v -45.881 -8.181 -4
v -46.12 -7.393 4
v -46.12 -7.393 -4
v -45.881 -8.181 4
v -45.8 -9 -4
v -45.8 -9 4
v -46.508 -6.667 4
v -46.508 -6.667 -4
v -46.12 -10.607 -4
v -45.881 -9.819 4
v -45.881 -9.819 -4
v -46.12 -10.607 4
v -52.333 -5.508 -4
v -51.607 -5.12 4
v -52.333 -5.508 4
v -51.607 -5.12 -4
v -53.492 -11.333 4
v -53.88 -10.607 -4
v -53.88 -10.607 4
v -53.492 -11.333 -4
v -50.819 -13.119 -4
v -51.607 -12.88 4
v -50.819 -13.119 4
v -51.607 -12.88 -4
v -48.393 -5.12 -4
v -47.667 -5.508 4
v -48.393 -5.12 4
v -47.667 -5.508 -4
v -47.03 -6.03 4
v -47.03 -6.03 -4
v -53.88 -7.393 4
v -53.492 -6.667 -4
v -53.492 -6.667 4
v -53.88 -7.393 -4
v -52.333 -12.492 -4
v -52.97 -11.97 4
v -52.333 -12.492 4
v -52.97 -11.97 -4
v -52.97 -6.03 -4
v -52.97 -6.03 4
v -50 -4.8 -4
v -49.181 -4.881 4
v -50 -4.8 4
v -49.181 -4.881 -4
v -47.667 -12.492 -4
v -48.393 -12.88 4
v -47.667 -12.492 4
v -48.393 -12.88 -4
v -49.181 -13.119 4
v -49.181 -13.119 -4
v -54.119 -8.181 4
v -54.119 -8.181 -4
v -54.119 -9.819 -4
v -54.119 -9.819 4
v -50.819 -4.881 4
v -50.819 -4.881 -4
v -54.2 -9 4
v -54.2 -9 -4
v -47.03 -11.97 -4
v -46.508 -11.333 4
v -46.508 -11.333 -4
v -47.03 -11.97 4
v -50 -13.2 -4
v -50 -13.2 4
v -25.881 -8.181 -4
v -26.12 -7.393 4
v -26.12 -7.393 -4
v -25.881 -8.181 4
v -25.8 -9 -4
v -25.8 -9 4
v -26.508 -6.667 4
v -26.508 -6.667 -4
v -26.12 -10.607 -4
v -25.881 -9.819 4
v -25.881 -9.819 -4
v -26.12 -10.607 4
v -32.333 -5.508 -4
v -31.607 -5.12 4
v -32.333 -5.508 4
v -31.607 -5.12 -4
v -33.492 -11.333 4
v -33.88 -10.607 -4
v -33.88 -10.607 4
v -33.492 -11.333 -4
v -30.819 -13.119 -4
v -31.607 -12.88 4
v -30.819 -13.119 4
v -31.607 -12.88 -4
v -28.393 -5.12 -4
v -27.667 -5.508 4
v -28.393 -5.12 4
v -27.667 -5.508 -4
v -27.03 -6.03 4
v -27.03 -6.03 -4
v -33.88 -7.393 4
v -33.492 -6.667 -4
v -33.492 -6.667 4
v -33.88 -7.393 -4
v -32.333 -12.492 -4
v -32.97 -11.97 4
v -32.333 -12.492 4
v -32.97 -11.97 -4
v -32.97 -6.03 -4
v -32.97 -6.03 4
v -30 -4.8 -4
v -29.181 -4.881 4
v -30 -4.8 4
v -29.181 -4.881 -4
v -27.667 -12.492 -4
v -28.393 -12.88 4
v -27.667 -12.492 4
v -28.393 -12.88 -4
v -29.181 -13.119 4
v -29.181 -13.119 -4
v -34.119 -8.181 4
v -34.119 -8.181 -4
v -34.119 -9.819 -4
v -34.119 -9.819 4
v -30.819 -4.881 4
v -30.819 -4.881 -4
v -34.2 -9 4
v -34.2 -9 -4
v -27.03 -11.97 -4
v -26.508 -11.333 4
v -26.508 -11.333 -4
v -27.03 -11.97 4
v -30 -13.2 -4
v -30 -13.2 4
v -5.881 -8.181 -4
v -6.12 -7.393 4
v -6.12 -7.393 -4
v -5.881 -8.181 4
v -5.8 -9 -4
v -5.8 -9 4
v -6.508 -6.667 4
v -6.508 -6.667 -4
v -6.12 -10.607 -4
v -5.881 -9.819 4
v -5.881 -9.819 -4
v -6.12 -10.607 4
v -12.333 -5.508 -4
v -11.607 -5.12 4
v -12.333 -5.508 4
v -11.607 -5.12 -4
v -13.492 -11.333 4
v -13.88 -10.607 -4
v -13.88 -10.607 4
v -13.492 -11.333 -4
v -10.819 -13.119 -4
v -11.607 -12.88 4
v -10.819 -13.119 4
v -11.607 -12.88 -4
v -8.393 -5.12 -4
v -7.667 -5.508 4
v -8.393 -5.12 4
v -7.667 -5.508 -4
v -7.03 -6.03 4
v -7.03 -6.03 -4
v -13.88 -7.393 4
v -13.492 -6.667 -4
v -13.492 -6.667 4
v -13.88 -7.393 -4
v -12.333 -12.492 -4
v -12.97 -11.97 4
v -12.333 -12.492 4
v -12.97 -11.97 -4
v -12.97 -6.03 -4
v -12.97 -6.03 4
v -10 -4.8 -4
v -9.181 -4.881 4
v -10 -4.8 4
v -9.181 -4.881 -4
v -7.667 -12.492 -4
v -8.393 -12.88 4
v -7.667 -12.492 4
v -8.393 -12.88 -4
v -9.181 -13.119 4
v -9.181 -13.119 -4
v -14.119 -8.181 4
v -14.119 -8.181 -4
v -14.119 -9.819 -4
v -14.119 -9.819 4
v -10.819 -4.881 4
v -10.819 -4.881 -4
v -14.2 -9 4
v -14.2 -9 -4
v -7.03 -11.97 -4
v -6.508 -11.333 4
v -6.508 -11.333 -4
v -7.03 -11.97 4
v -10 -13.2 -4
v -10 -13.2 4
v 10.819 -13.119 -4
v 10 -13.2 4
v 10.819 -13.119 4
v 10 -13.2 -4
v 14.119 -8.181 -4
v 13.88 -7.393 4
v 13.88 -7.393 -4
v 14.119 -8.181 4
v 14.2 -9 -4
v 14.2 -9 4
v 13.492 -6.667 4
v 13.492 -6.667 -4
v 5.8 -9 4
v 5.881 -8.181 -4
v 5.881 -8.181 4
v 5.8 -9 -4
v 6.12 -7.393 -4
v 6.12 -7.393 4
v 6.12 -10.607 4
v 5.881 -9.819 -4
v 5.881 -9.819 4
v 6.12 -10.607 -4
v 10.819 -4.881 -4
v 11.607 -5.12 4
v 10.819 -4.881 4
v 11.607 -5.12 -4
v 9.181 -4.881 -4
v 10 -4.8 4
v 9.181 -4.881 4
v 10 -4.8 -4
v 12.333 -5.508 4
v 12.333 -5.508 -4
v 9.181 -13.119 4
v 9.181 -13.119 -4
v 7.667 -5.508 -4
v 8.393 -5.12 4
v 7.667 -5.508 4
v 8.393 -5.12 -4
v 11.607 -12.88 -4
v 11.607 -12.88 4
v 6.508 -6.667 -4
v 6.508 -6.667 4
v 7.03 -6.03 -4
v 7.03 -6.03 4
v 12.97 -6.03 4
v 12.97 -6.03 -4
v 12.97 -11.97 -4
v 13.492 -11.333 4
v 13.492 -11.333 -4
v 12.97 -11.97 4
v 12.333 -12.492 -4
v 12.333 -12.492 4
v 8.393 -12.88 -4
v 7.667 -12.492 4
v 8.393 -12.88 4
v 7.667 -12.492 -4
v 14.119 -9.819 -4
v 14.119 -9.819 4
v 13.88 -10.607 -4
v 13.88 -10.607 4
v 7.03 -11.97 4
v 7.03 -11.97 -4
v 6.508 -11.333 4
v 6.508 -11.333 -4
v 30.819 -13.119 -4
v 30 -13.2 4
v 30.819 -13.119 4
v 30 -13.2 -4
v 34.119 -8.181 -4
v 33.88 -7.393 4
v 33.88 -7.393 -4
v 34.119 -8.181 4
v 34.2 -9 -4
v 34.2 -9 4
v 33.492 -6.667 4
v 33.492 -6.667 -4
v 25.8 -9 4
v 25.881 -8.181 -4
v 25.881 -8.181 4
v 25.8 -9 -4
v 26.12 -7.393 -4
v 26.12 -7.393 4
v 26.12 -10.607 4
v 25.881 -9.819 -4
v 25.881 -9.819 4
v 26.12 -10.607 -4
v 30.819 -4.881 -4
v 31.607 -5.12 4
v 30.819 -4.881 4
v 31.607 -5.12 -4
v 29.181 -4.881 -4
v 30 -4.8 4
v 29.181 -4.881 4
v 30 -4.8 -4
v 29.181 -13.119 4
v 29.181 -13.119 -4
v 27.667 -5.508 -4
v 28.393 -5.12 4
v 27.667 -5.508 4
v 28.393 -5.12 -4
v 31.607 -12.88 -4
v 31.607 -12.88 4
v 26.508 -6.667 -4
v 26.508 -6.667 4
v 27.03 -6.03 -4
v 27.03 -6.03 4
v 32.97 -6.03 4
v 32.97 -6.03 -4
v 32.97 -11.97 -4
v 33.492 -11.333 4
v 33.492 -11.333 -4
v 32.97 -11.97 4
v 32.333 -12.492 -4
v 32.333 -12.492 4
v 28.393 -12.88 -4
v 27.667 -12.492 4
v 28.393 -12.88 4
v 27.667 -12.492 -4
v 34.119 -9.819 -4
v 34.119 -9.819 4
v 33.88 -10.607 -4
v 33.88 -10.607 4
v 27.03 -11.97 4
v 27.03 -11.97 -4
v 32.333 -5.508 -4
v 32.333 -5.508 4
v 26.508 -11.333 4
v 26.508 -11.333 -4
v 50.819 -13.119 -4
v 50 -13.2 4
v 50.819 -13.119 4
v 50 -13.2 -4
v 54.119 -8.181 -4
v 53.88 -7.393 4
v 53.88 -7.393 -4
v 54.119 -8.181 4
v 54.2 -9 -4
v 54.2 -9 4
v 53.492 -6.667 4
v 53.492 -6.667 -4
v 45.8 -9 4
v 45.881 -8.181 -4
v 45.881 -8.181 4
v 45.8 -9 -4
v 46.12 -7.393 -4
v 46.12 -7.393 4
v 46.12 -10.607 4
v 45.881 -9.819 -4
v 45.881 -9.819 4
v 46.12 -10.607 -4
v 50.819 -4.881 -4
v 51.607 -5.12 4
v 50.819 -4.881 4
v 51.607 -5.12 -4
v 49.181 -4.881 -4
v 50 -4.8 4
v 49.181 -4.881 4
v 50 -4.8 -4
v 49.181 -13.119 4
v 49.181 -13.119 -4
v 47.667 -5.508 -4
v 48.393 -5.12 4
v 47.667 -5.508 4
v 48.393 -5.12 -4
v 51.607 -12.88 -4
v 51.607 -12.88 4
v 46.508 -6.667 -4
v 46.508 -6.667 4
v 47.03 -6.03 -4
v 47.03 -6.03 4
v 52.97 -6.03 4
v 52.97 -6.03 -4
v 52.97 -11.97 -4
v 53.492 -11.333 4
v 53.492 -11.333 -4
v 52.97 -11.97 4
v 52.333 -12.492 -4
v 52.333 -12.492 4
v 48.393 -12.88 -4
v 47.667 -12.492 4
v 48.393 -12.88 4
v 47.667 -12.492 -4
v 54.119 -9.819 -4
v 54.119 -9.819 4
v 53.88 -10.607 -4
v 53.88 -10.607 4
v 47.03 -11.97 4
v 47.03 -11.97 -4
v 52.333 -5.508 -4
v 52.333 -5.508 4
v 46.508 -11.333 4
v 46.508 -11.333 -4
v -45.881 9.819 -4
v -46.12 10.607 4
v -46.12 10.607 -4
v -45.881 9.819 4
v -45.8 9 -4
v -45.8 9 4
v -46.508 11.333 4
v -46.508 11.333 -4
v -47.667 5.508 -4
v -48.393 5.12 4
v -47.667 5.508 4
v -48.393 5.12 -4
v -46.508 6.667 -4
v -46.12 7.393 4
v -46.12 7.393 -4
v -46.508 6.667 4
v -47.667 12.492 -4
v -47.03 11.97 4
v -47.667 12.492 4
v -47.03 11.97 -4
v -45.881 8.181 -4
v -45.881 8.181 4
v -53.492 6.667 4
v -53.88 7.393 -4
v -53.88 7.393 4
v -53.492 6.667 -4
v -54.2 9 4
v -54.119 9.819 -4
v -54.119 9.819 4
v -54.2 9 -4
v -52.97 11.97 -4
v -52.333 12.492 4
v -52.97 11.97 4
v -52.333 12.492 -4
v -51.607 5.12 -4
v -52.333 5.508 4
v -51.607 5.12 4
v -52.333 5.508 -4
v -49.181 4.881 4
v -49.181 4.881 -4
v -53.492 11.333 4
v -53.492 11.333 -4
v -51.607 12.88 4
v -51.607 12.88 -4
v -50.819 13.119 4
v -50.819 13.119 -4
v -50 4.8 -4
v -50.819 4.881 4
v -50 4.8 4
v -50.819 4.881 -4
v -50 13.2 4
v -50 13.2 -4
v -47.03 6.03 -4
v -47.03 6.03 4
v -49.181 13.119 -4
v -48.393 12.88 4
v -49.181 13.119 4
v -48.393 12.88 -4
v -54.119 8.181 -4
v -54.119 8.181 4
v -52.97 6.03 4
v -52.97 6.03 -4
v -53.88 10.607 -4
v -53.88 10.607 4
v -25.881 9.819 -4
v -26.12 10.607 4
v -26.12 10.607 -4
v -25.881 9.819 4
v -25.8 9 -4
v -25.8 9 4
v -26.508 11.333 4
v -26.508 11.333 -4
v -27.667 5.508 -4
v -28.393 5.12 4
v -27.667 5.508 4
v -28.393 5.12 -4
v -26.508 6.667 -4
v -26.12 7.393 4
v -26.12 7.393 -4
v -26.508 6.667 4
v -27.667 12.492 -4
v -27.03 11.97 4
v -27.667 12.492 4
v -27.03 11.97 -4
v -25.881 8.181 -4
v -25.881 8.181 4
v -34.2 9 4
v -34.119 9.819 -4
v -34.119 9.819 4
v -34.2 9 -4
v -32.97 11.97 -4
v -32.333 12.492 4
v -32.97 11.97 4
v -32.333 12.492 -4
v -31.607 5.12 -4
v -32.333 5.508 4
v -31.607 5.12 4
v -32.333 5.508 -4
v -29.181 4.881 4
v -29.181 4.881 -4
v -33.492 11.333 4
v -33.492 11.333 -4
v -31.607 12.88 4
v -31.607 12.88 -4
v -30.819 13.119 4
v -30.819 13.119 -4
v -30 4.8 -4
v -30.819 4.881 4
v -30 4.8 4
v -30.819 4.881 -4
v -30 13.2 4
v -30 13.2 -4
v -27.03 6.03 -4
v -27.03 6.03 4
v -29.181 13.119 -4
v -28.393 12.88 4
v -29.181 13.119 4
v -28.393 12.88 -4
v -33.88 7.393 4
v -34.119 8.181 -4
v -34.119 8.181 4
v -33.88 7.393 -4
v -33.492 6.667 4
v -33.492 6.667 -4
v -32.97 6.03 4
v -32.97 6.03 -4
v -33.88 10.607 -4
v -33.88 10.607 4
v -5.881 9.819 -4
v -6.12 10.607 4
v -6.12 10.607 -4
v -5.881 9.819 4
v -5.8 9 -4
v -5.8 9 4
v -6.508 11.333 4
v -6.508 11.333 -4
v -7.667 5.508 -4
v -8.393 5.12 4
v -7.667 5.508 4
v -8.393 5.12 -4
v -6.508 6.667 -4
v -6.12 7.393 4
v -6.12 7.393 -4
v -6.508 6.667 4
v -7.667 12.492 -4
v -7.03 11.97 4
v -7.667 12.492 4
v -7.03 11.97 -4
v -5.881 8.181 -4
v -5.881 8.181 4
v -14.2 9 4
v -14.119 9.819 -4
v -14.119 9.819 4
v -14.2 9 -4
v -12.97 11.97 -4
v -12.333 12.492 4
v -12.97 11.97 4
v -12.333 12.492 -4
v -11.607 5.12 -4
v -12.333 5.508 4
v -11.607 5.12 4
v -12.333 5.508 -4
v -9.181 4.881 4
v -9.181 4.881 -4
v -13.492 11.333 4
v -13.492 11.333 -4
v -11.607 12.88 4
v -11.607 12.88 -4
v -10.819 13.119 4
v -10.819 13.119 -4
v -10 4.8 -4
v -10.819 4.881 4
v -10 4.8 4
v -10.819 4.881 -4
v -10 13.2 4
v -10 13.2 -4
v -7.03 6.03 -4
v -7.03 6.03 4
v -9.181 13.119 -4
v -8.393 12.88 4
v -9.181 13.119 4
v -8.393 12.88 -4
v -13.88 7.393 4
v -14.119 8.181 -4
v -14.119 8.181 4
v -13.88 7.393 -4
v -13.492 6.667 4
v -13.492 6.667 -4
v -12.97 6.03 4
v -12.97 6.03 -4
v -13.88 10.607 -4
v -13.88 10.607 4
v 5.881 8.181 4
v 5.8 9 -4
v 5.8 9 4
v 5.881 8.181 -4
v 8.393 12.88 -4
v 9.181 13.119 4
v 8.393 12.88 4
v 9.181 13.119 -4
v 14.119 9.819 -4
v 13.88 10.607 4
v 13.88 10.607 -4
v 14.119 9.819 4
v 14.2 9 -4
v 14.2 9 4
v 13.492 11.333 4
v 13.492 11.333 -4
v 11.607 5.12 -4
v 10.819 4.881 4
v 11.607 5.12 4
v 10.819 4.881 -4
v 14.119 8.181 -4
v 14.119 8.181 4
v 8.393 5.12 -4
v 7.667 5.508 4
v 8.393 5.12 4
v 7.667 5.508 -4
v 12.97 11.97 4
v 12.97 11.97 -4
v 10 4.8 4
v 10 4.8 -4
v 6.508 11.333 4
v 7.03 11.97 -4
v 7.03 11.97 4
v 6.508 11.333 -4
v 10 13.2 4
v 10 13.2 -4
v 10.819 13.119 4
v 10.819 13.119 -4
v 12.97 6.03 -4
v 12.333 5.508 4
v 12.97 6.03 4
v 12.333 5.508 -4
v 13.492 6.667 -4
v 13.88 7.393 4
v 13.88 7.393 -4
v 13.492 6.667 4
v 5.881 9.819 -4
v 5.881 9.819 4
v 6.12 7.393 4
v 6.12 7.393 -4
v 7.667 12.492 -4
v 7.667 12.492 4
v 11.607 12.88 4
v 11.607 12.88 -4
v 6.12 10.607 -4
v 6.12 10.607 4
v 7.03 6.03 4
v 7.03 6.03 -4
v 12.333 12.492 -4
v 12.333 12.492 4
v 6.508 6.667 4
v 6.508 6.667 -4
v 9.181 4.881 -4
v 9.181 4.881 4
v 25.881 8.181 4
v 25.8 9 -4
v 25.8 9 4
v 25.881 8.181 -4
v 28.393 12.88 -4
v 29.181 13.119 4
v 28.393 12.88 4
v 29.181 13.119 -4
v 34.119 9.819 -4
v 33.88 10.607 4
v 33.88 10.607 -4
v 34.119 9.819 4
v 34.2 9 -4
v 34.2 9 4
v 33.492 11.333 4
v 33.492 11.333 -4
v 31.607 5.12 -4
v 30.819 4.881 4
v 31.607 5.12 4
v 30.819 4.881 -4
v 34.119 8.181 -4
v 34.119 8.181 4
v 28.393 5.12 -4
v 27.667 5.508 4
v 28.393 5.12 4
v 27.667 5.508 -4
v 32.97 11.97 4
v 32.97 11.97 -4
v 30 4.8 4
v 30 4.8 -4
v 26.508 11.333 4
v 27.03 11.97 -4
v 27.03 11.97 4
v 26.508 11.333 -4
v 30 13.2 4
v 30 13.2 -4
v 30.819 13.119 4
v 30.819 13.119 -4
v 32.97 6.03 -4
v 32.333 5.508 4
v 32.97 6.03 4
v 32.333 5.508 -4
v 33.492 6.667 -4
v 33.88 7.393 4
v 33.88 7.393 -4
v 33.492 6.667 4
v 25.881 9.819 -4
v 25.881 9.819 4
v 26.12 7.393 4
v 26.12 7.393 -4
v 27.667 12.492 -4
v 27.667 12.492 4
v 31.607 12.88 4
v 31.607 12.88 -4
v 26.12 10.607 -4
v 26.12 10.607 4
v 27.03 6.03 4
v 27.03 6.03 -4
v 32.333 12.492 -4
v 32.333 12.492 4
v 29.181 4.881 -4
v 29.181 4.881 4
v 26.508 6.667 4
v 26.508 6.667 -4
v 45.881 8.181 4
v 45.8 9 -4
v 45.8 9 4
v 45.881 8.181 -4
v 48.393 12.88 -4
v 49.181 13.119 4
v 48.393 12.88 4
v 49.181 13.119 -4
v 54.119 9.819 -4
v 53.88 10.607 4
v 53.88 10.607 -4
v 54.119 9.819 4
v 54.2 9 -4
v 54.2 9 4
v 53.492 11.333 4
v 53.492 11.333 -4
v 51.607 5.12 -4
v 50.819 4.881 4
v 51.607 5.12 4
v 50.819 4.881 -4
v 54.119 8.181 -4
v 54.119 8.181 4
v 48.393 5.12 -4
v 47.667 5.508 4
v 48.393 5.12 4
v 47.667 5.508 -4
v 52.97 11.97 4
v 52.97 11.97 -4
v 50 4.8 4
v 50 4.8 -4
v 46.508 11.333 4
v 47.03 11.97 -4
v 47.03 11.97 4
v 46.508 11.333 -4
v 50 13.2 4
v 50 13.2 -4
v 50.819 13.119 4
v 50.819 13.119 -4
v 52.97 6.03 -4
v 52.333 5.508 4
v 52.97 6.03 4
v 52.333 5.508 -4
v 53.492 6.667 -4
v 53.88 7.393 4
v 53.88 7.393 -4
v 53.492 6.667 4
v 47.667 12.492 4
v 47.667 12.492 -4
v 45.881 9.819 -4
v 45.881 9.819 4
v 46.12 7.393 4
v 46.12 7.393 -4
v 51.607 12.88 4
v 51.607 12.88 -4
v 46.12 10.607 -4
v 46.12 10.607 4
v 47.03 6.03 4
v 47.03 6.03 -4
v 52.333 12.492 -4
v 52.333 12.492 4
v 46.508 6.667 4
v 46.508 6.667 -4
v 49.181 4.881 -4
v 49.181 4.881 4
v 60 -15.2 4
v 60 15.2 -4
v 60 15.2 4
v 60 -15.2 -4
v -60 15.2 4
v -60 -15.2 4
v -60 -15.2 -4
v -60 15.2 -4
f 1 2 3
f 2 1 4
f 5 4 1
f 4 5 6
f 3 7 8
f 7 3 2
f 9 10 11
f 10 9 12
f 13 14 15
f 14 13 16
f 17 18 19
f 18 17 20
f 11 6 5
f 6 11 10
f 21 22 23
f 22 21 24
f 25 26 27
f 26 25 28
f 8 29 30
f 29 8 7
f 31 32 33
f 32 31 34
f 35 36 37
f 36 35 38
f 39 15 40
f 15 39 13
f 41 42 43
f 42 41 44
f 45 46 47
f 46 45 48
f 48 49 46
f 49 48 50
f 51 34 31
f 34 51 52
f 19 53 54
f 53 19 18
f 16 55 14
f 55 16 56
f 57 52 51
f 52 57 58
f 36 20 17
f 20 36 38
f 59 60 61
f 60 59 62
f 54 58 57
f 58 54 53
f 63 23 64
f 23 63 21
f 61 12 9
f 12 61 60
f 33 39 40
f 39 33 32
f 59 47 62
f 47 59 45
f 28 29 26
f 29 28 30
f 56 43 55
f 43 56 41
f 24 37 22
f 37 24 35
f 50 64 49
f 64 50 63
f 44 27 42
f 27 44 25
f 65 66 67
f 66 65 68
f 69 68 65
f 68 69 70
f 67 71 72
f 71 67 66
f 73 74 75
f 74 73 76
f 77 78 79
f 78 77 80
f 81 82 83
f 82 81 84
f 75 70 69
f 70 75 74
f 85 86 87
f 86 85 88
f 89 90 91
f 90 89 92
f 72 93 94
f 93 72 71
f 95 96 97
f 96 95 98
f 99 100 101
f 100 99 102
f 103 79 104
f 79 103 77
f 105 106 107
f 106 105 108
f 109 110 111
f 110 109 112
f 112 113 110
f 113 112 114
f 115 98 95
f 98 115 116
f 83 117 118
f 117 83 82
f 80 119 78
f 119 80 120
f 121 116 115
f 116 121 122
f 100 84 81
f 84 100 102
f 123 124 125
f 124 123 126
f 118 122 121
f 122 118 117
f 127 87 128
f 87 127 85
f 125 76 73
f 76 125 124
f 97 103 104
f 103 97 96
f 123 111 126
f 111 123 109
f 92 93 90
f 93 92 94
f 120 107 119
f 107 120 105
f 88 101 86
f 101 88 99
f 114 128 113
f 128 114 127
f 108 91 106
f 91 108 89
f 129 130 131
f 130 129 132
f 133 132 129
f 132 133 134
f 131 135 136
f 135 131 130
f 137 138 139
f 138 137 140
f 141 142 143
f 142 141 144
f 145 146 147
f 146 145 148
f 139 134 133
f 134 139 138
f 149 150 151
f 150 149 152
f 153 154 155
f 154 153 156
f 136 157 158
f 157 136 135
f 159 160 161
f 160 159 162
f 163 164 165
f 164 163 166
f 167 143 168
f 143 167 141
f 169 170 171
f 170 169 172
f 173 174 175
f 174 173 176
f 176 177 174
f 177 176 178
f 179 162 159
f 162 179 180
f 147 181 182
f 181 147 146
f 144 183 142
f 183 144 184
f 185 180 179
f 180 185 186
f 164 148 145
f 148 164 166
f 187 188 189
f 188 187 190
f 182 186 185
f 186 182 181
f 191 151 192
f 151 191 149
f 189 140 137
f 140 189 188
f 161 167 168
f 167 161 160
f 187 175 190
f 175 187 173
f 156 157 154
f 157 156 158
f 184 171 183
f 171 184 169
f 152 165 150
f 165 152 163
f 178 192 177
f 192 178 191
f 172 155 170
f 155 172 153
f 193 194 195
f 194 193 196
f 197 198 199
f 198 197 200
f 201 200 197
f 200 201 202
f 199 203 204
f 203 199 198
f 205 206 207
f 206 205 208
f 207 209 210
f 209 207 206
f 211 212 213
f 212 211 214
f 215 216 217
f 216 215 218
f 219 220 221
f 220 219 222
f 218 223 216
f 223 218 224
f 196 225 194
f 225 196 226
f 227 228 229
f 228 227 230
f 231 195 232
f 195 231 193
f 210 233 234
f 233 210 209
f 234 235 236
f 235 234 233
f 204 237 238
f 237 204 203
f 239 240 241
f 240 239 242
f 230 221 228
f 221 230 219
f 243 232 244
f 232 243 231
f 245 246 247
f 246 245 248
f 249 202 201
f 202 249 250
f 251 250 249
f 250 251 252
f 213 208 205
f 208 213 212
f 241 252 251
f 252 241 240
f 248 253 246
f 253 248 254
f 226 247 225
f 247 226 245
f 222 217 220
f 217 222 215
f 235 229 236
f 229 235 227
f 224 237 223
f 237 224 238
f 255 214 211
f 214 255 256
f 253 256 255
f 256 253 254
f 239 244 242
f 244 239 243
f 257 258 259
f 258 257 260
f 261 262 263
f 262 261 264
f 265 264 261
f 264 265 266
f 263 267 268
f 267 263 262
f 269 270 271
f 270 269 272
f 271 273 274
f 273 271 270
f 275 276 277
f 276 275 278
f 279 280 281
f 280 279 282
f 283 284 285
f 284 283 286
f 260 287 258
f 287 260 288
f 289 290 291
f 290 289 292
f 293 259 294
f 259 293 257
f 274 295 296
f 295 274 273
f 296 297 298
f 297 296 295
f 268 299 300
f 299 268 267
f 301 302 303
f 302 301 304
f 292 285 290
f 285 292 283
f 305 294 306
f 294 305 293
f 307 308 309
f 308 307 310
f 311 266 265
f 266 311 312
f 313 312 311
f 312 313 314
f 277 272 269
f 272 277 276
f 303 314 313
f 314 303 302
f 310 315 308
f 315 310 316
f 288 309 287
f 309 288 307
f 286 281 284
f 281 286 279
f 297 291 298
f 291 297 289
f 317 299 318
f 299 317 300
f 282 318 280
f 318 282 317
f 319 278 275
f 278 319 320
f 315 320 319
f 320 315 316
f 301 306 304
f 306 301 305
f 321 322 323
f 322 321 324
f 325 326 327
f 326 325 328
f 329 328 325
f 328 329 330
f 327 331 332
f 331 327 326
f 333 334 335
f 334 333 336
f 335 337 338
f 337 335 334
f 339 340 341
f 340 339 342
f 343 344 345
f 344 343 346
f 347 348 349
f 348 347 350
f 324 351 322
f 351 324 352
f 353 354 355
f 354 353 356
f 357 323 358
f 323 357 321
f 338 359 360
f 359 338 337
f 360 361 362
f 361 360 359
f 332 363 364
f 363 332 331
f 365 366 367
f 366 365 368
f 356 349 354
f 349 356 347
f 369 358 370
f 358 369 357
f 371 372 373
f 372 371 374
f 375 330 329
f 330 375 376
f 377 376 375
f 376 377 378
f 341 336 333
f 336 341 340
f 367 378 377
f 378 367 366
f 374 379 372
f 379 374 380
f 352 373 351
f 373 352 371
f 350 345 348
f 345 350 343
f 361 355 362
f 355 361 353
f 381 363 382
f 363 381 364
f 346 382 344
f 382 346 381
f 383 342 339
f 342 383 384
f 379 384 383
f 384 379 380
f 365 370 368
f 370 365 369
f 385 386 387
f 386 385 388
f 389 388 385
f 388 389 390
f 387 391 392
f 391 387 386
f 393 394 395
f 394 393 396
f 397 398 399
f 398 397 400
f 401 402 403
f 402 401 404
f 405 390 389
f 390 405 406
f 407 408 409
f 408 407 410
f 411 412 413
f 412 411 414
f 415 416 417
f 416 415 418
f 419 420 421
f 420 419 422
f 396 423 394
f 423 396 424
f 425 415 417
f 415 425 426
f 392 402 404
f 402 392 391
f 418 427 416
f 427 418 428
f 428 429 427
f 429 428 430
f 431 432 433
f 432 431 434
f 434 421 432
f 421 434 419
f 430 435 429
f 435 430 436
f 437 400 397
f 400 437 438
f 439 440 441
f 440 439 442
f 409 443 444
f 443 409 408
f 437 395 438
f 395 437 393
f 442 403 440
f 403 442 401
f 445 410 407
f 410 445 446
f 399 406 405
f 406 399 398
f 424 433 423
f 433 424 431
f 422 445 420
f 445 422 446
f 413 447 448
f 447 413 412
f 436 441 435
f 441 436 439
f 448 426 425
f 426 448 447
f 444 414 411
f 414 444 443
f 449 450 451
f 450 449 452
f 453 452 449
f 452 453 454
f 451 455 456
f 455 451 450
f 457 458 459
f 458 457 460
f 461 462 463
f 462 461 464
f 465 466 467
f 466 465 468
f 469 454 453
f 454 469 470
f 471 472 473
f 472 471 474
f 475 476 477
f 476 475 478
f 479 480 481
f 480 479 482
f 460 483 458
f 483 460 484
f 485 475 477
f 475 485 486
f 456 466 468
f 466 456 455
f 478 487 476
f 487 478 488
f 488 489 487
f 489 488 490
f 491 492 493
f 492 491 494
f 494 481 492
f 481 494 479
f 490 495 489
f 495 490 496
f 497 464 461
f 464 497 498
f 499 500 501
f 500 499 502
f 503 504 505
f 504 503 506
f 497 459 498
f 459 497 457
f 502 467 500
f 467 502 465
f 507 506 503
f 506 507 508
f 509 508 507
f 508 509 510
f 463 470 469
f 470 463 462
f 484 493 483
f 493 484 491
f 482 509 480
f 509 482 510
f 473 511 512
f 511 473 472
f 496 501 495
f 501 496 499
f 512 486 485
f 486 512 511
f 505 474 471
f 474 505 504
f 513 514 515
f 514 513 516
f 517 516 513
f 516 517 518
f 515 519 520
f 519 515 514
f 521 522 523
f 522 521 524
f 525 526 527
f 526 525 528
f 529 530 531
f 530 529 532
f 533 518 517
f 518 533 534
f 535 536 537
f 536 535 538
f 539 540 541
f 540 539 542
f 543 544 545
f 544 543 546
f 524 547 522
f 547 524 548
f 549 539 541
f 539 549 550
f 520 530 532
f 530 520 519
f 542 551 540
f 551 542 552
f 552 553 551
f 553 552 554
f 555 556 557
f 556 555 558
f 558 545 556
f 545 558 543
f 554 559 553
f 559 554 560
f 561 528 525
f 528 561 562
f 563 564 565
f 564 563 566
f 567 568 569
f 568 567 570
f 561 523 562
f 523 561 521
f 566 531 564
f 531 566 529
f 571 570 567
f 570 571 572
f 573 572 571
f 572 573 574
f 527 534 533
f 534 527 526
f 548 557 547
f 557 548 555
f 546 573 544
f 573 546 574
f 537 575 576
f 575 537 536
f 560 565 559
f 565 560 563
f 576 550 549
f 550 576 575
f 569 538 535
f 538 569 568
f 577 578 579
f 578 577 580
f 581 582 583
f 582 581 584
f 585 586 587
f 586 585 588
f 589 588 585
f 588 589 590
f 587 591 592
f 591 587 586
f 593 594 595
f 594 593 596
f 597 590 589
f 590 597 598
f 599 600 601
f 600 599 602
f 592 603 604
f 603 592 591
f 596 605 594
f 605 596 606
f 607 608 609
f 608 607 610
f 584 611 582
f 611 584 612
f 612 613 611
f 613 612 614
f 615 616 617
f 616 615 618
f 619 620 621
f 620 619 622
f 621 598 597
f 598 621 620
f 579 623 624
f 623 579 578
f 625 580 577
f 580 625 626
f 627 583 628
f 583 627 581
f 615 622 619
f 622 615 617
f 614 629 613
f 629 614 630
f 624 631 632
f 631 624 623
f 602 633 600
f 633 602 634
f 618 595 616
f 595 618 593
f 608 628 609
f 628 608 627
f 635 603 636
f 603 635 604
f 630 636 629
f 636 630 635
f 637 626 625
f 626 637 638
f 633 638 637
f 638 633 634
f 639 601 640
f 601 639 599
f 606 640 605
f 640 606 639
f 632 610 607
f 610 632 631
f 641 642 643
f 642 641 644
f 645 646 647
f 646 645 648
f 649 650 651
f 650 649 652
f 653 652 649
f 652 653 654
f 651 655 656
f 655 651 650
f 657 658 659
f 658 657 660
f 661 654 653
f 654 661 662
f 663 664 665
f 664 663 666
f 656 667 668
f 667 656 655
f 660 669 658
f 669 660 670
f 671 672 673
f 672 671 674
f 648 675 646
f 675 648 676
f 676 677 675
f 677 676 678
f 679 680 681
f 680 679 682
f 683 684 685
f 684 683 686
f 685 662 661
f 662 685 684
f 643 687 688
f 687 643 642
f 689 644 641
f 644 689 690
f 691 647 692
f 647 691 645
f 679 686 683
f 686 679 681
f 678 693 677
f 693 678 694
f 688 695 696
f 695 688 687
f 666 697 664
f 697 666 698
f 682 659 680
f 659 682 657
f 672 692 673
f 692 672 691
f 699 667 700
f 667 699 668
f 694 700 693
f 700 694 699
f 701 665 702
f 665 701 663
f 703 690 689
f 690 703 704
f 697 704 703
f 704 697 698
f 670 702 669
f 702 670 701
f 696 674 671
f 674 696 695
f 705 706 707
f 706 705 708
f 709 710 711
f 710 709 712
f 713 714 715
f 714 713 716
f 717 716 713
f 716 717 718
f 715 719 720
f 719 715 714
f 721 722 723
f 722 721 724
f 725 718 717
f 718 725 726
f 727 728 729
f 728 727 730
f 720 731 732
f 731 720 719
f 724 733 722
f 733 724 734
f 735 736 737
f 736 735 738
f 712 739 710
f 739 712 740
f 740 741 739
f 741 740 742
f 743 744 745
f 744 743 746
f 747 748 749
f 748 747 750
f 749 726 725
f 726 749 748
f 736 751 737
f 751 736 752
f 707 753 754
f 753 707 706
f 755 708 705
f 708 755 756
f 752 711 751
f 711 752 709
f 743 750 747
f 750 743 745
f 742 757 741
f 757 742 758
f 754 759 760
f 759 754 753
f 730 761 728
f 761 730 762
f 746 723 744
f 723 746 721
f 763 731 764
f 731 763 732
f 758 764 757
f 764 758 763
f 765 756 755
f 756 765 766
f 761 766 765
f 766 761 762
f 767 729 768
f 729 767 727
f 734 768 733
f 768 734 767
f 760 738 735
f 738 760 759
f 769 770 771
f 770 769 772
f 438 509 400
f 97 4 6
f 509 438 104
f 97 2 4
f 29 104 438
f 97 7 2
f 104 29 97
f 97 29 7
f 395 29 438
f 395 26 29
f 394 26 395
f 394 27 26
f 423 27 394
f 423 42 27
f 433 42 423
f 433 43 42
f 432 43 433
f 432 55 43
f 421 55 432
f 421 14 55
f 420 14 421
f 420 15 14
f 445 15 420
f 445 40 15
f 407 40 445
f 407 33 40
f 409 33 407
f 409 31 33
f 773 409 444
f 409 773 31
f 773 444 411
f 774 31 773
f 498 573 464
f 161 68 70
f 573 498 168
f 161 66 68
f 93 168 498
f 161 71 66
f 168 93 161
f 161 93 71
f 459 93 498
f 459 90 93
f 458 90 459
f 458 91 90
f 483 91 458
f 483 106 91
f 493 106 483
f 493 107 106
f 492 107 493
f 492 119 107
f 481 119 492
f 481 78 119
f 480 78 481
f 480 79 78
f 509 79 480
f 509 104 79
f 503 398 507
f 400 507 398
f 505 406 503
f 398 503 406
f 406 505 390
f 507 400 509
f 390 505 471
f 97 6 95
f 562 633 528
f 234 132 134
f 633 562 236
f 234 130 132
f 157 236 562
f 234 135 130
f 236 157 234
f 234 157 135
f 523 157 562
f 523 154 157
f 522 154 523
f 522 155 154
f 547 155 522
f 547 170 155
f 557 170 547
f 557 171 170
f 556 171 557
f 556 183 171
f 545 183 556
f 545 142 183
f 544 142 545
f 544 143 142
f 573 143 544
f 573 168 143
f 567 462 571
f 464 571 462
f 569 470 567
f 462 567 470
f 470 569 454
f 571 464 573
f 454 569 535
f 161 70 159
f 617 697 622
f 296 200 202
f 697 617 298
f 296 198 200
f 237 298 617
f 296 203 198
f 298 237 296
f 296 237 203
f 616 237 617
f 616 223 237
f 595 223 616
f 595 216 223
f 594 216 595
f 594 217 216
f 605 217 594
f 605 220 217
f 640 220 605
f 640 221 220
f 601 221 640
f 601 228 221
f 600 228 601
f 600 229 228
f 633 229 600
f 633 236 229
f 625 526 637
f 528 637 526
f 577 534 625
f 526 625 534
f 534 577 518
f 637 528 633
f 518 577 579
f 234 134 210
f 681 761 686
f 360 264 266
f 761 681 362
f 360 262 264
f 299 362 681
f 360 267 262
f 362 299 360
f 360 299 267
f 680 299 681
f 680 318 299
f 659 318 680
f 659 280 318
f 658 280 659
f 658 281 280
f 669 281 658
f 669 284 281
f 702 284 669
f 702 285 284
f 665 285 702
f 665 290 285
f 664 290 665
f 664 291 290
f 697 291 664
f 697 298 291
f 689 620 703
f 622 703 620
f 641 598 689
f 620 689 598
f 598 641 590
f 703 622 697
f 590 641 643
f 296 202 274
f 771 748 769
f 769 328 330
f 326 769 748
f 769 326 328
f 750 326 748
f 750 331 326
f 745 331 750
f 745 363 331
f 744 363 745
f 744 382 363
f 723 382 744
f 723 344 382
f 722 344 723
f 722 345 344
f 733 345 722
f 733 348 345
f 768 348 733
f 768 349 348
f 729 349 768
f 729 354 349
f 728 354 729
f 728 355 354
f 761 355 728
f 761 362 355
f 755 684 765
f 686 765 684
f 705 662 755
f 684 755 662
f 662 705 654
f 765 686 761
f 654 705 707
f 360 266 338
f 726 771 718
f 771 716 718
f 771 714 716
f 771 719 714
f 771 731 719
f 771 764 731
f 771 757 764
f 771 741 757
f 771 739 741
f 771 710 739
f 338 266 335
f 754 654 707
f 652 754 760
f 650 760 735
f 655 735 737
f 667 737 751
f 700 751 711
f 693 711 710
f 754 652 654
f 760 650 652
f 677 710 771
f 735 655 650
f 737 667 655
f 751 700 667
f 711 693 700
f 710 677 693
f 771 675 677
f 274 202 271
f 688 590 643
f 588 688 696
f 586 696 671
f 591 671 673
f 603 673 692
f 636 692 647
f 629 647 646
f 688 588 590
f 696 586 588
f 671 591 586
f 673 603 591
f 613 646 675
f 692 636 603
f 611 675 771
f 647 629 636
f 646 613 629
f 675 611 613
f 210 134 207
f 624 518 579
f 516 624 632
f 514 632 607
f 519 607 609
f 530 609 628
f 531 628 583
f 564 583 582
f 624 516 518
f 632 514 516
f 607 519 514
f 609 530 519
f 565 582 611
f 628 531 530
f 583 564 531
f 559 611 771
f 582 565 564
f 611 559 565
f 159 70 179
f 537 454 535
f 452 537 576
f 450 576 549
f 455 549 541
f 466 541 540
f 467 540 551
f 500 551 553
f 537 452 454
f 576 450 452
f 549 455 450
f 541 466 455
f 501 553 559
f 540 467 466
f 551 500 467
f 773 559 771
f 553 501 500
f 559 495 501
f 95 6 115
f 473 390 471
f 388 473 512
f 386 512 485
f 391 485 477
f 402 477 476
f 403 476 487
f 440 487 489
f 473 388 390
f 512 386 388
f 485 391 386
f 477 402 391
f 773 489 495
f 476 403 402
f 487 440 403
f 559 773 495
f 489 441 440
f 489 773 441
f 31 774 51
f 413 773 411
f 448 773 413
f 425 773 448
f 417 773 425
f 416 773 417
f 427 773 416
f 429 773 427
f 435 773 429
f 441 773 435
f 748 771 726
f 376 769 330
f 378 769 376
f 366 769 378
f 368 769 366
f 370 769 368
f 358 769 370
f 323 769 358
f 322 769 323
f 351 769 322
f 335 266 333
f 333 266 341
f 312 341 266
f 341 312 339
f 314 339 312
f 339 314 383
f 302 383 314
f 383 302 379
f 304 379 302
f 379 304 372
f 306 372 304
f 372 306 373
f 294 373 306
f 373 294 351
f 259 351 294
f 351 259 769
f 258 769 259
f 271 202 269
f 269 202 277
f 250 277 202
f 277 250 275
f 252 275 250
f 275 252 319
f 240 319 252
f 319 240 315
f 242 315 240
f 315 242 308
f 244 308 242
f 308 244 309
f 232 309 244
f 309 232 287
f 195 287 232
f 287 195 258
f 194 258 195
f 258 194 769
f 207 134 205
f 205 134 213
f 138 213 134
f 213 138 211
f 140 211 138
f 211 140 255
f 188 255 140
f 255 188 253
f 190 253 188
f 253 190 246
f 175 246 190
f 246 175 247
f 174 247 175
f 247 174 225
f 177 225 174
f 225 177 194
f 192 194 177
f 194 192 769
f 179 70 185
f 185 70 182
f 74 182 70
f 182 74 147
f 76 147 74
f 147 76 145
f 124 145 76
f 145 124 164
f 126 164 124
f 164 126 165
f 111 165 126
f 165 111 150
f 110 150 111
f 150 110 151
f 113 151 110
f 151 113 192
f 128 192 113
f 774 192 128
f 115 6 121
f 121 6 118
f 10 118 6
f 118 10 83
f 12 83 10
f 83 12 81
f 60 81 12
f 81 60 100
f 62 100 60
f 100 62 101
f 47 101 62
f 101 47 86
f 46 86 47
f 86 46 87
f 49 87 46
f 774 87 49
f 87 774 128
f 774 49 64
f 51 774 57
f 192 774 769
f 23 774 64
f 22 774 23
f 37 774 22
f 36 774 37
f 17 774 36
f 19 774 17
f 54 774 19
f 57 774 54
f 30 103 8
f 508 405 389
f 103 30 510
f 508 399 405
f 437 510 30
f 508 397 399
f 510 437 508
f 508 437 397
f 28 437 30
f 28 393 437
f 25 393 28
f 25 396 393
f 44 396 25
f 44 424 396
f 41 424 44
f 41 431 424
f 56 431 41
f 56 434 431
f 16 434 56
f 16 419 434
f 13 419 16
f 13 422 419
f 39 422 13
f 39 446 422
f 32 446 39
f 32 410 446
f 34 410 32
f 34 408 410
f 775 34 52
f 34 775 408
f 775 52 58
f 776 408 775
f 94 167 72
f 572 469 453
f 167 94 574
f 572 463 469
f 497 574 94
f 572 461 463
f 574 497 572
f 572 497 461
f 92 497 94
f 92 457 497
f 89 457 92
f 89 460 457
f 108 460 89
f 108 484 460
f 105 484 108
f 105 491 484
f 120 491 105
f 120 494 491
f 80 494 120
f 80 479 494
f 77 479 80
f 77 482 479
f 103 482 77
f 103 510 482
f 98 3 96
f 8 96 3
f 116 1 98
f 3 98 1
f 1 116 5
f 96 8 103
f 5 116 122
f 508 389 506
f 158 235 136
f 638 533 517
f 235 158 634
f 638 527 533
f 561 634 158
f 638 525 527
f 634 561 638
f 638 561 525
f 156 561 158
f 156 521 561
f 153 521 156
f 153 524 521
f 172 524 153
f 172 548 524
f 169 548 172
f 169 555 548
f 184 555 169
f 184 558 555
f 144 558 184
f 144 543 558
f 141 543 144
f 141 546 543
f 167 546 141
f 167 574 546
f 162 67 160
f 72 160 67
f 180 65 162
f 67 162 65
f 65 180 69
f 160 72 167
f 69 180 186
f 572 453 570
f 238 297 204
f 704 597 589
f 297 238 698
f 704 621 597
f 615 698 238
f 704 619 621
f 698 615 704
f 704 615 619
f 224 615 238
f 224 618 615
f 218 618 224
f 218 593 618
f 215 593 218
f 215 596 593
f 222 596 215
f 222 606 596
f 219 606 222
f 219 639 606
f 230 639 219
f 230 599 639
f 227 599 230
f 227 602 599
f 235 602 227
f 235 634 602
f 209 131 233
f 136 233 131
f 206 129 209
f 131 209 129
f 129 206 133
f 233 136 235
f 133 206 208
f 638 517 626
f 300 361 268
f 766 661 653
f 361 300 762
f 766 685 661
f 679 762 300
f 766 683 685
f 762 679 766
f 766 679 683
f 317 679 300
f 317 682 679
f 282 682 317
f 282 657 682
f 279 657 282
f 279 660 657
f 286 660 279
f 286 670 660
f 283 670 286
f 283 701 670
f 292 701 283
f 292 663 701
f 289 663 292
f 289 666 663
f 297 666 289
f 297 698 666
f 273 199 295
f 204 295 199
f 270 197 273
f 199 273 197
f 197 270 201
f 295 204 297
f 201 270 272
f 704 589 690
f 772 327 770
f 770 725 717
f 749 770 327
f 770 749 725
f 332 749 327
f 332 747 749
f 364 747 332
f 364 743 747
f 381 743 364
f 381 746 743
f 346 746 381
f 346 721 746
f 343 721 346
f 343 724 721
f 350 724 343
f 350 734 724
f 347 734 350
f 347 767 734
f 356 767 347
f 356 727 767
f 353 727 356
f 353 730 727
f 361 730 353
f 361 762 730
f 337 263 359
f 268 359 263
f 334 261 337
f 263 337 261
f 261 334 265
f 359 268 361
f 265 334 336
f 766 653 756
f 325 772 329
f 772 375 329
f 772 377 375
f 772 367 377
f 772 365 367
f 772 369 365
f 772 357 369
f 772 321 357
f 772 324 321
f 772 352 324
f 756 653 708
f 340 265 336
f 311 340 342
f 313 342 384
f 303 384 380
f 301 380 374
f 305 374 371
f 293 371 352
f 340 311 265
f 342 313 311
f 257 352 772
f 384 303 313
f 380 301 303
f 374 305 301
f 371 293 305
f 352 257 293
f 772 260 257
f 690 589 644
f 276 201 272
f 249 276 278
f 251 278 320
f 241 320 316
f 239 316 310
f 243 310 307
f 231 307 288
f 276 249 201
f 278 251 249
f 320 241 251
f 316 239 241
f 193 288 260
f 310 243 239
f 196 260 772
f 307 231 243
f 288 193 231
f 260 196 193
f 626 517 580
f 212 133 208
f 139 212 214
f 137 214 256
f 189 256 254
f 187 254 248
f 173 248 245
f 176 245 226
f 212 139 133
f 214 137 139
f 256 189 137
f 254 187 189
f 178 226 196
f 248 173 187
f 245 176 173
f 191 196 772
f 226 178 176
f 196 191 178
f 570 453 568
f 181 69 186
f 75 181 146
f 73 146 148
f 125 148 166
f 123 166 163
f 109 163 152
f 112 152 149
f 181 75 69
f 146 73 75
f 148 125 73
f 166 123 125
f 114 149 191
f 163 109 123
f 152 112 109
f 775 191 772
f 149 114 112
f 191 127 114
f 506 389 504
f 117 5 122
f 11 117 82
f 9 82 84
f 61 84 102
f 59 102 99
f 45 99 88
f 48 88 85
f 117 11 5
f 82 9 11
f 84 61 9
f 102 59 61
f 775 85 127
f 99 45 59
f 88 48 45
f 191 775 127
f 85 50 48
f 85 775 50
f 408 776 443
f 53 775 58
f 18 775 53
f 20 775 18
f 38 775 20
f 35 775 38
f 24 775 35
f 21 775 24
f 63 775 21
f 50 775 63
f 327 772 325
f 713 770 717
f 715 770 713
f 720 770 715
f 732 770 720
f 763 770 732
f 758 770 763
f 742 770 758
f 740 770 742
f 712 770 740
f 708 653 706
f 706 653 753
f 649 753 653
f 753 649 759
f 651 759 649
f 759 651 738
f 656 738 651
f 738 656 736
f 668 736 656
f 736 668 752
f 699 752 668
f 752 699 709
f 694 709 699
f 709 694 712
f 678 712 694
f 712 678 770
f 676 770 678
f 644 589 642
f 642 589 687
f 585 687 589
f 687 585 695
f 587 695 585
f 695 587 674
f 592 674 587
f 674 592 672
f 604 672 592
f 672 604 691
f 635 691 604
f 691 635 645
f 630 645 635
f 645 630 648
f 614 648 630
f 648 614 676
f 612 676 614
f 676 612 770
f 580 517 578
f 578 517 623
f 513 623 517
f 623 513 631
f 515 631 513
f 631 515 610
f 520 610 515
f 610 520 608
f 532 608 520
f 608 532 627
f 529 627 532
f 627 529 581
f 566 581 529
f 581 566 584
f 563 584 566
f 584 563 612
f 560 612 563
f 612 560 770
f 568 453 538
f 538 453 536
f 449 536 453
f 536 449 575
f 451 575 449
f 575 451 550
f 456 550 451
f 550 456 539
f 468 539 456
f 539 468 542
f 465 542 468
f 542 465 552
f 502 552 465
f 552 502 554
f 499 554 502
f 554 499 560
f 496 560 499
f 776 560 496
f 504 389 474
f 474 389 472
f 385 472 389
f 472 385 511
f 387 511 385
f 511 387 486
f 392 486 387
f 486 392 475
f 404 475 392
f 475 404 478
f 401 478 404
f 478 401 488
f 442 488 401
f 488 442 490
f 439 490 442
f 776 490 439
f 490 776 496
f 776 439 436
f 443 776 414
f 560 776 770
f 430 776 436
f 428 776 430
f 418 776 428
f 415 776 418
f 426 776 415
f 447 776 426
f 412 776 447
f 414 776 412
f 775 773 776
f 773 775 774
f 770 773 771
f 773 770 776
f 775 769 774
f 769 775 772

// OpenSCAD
$fn = 32;

// ----------------------------------------------------------------------
// Hole bar, 6 x Ø8.4
// tworows layout, 10 mm edge offset
// ----------------------------------------------------------------------

// --- parameters (mm) ---
bar_w = 30.4;     // bar width (Y)
bar_t = 8;        // bar thickness (Z)
holes = 6;        // holes per row
hole_d = 8.4;     // hole diameter
edge = 10;        // offset from the bar end to the first hole
pitch = 20;       // pitch between neighbouring holes
row_offset = 18;  // distance between the two rows

// --- derived feature positions (mm) ---
span = (holes - 1) * pitch;   // = 100   distance between the end holes
bar_l = span + 2 * edge;      // = 120   overall bar length
start_x = -bar_l / 2 + edge;  // = -50   X of the first hole
feature_centers = [
  [start_x + 0 * pitch, -row_offset / 2],
  [start_x + 1 * pitch, -row_offset / 2],
  [start_x + 2 * pitch, -row_offset / 2],
  [start_x + 3 * pitch, -row_offset / 2],
  [start_x + 4 * pitch, -row_offset / 2],
  [start_x + 5 * pitch, -row_offset / 2]
];   // hole centres of the first row
row2_centers = [
  [start_x + 0 * pitch, row_offset / 2],
  [start_x + 1 * pitch, row_offset / 2],
  [start_x + 2 * pitch, row_offset / 2],
  [start_x + 3 * pitch, row_offset / 2],
  [start_x + 4 * pitch, row_offset / 2],
  [start_x + 5 * pitch, row_offset / 2]
];   // hole centres of the second row

// bar with two rows of holes, both read from their own centre arrays
difference() {
  translate([-bar_l / 2, -bar_w / 2, -bar_t / 2]) cube([bar_l, bar_w, bar_t]);
  for (centre = feature_centers)
    translate([centre[0], centre[1], 0])
      cylinder(d = hole_d, h = bar_t + 2, center = true);
  for (centre = row2_centers)
    translate([centre[0], centre[1], 0])
      cylinder(d = hole_d, h = bar_t + 2, center = true);
}
